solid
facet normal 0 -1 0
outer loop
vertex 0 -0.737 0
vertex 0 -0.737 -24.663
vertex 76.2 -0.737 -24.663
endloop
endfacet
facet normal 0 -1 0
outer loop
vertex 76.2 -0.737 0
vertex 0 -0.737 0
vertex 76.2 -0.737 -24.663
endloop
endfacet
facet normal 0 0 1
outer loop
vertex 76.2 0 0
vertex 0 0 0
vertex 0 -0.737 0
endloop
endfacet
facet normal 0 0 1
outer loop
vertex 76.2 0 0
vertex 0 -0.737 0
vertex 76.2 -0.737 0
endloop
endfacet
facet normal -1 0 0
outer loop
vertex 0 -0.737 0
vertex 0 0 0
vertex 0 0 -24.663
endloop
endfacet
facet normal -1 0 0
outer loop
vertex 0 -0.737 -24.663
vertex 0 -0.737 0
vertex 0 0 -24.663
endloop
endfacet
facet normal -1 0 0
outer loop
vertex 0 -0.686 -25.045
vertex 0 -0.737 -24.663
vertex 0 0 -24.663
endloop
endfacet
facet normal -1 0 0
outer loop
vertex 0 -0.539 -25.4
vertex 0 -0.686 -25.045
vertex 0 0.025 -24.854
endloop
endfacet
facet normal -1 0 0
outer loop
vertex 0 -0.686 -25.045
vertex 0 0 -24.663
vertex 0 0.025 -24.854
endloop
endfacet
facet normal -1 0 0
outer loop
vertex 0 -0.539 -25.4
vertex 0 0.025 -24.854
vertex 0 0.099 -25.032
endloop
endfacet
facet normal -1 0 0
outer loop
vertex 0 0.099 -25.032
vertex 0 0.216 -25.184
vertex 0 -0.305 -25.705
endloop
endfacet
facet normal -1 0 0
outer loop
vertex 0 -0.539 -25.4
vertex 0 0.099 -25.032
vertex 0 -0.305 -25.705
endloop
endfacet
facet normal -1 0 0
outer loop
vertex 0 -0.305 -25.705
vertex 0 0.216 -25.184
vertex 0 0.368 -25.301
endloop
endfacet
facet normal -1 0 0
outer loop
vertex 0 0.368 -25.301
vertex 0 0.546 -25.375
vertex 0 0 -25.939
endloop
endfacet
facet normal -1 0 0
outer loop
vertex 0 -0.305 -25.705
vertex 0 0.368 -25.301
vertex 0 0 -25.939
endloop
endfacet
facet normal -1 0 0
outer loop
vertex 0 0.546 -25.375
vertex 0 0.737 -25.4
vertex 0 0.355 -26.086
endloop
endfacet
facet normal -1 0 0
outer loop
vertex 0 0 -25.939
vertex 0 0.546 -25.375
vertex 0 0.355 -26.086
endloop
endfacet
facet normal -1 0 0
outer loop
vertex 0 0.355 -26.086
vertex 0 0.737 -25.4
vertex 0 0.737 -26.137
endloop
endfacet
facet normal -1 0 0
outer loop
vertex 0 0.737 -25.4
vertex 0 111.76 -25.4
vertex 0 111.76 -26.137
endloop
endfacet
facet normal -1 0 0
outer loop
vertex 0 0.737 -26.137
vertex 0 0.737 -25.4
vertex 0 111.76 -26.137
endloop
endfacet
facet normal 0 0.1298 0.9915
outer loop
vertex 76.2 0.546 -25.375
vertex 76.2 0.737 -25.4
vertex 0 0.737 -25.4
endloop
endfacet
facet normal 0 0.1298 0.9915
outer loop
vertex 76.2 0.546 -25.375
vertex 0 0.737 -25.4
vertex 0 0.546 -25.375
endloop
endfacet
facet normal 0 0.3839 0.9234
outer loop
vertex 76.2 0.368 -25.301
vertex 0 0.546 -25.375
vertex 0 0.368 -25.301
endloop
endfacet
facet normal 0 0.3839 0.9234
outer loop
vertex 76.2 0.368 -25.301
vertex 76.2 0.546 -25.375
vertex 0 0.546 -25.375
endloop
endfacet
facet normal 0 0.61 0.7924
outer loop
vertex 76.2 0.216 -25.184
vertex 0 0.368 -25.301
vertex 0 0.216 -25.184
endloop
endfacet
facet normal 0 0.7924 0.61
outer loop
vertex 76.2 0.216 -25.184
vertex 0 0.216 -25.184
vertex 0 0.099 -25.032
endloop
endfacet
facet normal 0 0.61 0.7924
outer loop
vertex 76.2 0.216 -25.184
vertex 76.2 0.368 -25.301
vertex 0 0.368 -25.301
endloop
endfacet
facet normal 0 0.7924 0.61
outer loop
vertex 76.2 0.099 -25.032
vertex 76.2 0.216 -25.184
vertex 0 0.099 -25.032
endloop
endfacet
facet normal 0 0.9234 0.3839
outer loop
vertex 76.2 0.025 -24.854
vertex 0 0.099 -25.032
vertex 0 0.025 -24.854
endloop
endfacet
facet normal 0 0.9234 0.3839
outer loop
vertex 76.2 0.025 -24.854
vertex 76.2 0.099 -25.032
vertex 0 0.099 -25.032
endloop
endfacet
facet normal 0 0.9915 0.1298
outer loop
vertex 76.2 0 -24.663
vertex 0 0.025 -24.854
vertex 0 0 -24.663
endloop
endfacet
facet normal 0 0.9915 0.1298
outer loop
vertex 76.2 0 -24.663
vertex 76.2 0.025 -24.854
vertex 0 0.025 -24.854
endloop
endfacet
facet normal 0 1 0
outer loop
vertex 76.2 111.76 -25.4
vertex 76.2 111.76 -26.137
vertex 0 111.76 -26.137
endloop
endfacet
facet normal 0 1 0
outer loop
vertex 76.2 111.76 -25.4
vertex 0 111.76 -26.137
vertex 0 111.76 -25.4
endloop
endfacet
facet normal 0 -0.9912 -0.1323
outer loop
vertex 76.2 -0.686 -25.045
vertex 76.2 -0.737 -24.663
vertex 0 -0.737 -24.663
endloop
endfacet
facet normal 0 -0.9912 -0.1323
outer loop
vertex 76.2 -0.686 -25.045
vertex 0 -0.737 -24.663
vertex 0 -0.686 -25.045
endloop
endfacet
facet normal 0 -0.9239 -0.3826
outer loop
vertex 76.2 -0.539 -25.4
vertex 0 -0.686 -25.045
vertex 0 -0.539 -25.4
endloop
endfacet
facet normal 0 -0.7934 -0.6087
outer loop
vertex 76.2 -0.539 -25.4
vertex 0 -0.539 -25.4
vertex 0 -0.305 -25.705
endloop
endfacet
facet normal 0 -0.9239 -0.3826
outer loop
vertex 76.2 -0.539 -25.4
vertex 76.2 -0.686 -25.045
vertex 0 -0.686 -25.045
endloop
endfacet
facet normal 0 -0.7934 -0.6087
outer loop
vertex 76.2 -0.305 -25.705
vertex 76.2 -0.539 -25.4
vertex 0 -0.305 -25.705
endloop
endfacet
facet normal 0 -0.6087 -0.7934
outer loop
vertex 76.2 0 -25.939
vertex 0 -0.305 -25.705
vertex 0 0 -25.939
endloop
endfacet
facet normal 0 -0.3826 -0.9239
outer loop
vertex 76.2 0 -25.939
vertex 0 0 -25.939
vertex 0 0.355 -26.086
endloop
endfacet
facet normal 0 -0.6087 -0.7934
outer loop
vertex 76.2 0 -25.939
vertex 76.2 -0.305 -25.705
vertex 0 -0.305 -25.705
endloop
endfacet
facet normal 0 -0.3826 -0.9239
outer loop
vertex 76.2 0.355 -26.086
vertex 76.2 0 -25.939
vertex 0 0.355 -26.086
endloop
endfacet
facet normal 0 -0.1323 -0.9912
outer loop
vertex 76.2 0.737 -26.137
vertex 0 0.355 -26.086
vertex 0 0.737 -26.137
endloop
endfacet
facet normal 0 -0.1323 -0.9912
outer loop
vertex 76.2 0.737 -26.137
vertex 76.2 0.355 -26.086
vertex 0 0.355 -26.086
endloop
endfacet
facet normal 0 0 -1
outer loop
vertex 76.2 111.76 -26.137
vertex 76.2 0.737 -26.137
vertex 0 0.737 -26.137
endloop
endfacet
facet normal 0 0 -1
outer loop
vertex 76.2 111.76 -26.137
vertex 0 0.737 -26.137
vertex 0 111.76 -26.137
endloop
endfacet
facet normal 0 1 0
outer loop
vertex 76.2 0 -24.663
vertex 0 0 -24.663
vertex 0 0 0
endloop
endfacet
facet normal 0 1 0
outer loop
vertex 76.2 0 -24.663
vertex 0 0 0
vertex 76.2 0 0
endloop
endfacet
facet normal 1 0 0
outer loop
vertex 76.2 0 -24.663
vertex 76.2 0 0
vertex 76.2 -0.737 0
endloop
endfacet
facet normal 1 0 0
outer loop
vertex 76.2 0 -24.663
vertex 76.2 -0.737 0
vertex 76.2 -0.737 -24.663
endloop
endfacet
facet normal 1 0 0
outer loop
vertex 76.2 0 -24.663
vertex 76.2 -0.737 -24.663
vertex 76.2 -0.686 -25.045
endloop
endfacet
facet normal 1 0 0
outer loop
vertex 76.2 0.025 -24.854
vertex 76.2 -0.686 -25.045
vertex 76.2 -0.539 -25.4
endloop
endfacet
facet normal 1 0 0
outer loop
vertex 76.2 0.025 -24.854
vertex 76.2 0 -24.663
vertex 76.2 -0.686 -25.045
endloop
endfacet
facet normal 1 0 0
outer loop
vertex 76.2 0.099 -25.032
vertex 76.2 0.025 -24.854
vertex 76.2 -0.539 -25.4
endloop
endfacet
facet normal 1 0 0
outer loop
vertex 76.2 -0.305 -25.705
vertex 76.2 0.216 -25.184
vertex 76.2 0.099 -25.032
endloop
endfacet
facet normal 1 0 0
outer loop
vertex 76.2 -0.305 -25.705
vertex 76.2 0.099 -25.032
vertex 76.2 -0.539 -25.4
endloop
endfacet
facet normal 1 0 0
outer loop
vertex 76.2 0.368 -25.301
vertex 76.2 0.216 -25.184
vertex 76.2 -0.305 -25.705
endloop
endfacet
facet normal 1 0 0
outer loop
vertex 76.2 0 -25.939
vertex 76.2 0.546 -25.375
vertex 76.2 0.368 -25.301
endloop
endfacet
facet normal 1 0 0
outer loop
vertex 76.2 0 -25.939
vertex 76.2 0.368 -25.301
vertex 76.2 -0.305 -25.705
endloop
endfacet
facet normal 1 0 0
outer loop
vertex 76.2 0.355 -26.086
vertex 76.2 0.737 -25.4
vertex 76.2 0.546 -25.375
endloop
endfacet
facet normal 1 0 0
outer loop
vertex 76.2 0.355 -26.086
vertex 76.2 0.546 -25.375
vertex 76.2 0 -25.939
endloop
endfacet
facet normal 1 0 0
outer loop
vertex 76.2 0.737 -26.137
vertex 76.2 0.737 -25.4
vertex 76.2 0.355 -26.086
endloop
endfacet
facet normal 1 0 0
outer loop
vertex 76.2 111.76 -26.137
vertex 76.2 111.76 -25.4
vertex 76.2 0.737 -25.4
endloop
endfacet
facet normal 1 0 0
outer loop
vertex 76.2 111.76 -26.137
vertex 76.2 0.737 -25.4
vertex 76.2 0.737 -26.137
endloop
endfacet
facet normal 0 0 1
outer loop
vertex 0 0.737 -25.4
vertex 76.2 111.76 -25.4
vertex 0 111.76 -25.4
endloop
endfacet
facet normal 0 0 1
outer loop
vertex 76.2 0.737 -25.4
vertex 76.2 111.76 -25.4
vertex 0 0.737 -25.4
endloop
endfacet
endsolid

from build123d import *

# Parameters (mm, degrees)
SKETCH1_W                    = 76.2
SKETCH1_H                    = 25.4
BASE_FLANGE1_DEPTH           = 0.7366
EDGE_FLANGE1_STRIP_W         = 4.4196
EDGE_FLANGE1_STRIP_H         = 0.7366
EDGE_FLANGE1_STRIP_CUT_DEPTH = 76.2
EDGE_FLANGE1_DEPTH           = 76.2


# Sheet-metal steps are written as plain solids
with BuildPart() as part:
    # Sketch1 → Base-Flange1 (new body)
    with BuildSketch(Plane(origin=(0, 0, 0), x_dir=(1, 0, 0), z_dir=(0, 1, 0))):
        with Locations((38.1, 12.7)):
            Rectangle(SKETCH1_W, SKETCH1_H)
    extrude(amount=-BASE_FLANGE1_DEPTH)

    # Edge-Flange1 strip (across the edge) → Edge-Flange1 strip cut (cut)
    with BuildSketch(Plane(origin=(76.2, 0, -25.4), x_dir=(0, 0, 1), z_dir=(-1, 0, 0))):
        with Locations((-1.4732, -0.3683)):
            Rectangle(EDGE_FLANGE1_STRIP_W, EDGE_FLANGE1_STRIP_H)
    extrude(amount=EDGE_FLANGE1_STRIP_CUT_DEPTH, mode=Mode.SUBTRACT)

    # Edge-Flange1 section (across the edge) → Edge-Flange1 (add)
    with BuildSketch(Plane(origin=(76.2, 0, -25.4), x_dir=(0, 0, 1), z_dir=(-1, 0, 0))):
        with BuildLine():
            Line((-0.7366, 0.7366), (-0.7366, 111.76))
            Line((-0.7366, 111.76), (0, 111.76))
            Line((0, 111.76), (0, 0.7366))
            ThreePointArc((0, 0.7366), (0.215745145, 0.215745145), (0.7366, 0))
            Line((0.7366, 0), (0.7366, -0.7366))
            ThreePointArc((0.7366, -0.7366), (-0.30510971, -0.30510971), (-0.7366, 0.7366))
        make_face()
    extrude(amount=EDGE_FLANGE1_DEPTH)


solid = part.part
